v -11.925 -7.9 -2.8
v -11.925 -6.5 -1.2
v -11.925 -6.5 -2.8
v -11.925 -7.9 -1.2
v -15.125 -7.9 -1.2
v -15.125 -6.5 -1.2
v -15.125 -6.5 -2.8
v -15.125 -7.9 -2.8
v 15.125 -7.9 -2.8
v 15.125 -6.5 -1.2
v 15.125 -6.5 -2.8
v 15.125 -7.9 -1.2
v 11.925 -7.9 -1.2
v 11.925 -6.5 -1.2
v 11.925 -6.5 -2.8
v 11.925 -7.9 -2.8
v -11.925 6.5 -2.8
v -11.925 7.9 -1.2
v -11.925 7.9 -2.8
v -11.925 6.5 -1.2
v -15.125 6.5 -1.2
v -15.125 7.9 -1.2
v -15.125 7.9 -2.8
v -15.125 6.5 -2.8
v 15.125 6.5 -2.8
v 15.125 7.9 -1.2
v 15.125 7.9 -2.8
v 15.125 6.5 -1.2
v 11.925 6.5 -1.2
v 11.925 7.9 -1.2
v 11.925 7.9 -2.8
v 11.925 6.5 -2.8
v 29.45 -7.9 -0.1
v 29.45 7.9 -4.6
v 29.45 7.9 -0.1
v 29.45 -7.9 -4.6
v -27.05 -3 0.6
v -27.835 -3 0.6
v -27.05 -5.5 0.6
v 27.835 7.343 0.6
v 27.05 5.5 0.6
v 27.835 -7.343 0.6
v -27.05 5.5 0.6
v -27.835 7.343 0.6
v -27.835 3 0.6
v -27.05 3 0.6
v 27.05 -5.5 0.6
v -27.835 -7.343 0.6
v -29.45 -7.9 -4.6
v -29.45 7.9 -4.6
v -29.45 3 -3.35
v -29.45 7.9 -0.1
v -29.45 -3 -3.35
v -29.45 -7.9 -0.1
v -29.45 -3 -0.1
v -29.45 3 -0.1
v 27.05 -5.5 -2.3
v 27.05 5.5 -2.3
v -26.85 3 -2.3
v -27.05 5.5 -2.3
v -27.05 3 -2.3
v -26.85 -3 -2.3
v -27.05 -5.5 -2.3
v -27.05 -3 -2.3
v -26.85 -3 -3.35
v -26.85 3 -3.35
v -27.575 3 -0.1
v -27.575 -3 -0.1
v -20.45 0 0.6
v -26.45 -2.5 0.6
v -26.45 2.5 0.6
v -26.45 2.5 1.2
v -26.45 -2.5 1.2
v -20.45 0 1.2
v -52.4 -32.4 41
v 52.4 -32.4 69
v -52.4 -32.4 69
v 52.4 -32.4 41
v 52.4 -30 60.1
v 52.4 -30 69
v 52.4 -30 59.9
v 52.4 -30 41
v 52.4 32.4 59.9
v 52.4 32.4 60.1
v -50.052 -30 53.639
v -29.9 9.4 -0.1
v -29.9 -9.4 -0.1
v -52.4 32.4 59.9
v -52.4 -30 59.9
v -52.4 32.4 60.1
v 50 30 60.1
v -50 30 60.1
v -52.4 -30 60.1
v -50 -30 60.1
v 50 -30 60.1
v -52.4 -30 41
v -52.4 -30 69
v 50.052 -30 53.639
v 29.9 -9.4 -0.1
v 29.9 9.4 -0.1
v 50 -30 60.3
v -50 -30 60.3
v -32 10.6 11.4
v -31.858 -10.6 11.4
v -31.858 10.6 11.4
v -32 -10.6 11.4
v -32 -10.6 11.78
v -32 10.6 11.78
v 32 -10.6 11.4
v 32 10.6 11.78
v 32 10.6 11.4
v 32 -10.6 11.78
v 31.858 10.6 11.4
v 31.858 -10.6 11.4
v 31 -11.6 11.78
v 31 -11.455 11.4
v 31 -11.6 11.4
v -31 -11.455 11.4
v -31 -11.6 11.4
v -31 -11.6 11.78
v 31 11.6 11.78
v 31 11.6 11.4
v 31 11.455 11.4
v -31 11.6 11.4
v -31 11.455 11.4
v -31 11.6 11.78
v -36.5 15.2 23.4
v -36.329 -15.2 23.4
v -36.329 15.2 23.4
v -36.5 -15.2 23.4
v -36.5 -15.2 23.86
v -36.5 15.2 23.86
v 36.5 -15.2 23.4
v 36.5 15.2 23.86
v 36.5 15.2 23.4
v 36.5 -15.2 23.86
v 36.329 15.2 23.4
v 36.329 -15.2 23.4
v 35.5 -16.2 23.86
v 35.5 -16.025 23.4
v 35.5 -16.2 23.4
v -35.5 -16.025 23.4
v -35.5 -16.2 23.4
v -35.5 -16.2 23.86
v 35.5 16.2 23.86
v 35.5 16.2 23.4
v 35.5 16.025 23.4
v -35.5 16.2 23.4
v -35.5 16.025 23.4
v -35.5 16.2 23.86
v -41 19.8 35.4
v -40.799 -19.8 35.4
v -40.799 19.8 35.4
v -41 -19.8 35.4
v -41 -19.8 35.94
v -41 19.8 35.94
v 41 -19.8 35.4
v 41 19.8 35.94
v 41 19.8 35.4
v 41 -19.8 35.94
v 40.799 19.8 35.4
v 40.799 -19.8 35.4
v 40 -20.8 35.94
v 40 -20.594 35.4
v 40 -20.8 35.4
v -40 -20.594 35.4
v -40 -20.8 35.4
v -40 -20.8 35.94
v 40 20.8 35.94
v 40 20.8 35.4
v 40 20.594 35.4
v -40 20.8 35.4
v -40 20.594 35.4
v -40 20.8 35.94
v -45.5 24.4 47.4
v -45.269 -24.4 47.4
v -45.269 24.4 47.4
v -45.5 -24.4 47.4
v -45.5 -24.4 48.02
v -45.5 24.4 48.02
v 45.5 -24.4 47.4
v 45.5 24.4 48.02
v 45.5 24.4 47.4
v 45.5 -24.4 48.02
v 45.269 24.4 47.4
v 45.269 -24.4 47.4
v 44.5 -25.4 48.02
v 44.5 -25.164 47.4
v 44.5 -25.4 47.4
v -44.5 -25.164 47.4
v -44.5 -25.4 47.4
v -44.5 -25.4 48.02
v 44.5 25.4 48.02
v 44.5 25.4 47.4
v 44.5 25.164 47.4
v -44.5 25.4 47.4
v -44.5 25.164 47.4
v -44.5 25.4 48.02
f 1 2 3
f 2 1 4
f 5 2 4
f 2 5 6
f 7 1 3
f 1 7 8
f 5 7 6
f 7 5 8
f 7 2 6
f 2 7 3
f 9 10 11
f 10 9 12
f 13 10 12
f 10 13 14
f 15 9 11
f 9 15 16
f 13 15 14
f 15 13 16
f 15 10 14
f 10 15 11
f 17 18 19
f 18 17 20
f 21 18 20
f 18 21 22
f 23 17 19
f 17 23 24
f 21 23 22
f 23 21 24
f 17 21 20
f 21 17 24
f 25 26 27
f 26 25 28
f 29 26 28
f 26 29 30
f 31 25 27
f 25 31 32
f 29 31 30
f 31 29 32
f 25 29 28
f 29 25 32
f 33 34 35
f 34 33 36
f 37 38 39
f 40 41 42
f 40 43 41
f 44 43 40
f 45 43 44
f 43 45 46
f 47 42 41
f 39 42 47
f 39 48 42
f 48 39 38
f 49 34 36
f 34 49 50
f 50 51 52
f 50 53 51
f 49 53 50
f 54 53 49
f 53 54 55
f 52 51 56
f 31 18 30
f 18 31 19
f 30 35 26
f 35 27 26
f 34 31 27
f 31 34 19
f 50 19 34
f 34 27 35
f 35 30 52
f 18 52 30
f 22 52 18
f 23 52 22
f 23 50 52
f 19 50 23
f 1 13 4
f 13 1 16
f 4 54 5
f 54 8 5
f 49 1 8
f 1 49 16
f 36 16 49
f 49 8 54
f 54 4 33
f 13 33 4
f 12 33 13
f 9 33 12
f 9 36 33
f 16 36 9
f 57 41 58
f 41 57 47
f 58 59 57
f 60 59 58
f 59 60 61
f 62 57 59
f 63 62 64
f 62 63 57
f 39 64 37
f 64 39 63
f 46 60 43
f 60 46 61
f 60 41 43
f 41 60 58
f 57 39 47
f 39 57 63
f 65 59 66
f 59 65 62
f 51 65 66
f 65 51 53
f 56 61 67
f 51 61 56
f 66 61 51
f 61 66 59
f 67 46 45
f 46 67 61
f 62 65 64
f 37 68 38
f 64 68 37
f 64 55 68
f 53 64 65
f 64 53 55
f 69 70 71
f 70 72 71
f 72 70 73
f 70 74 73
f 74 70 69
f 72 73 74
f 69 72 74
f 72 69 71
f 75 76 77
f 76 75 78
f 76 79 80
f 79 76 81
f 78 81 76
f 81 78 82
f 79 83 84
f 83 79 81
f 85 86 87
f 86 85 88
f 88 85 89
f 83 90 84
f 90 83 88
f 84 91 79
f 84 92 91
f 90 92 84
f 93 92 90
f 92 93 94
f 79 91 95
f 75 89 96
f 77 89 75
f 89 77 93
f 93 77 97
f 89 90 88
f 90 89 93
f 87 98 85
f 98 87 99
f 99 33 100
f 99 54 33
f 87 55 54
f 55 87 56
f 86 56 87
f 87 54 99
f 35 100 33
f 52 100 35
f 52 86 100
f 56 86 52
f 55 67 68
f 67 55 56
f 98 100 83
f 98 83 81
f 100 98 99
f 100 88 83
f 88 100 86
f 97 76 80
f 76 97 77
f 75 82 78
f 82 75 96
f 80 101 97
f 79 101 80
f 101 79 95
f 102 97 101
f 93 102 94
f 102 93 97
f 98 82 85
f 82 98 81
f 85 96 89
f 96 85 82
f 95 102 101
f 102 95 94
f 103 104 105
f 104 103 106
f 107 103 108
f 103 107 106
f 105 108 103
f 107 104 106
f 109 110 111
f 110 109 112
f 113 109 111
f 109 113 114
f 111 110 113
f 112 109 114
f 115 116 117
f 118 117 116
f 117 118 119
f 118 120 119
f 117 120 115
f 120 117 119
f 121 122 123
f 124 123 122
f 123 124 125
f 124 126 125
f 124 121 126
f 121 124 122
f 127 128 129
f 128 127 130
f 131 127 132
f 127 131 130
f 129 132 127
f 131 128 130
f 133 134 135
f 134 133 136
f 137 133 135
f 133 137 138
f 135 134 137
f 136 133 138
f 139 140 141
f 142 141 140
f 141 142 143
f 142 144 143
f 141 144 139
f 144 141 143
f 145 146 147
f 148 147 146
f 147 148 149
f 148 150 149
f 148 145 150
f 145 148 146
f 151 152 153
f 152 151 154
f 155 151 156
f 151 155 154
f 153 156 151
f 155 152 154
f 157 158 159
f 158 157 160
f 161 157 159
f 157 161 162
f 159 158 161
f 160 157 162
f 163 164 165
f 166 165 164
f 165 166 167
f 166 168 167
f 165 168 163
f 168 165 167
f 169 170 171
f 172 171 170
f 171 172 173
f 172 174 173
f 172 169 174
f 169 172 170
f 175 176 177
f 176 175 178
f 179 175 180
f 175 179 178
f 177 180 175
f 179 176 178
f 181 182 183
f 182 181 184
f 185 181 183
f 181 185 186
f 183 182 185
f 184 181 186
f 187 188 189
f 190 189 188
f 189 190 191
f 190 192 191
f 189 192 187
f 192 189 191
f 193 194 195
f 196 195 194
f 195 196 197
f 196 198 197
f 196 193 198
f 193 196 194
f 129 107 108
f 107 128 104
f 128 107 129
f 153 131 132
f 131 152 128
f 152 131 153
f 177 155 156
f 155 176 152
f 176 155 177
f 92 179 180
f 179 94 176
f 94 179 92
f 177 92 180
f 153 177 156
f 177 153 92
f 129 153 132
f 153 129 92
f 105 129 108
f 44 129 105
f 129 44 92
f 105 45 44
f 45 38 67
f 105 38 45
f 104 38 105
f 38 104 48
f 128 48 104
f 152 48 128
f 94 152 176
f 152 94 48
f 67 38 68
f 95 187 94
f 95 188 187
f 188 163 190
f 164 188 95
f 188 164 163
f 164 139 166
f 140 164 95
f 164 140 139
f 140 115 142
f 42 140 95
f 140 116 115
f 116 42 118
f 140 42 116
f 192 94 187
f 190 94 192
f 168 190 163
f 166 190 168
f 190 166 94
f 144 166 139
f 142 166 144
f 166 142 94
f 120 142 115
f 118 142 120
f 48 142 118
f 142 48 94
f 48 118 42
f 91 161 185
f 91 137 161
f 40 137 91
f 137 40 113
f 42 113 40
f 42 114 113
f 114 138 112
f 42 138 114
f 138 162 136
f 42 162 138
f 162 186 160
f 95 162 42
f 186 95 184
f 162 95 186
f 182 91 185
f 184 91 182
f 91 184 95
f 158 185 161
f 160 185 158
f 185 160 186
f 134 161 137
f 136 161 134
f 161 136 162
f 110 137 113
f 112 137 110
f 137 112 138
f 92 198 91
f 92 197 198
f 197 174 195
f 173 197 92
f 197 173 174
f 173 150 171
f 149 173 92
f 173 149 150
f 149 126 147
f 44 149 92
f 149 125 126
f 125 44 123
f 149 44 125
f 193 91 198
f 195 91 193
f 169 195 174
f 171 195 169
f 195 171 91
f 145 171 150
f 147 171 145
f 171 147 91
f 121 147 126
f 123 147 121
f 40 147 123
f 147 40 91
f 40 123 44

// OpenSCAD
// LED hood + rail for one trifold position (3 WS2812E LEDs).
// Starting sizes — measure your strip and retune before printing a full set.
// See README heading "Prints".
// Print mouth-down for clean walls.

$fn = 48;

// --- Strip (measure yours; 5 V 60/m is often 10 mm wide, ~16.7 mm pitch) ---
led_pitch = 16.7;
leds_per_group = 3;
strip_width = 10;
strip_thickness = 2.2;
rail_channel_extra = 1;     // channel ~1 mm wider than the strip
rail_channel_depth = 2;
rail_wall = 2.4;
rail_lip = 0.8;             // holds the strip without relying on adhesive
zip_slot_w = 3.2;
zip_slot_h = 1.6;

// --- Hood (rectangular snoot) ---
led_opening_w = 55;         // inner opening at the LED end
led_opening_h = 14;
mouth_w = 100;              // flare at the mouth (guide: 90–110)
mouth_h = 60;               // flare at the mouth (guide: 50–70)
hood_depth = 60;            // guide: 50–70
wall = 2.4;
visor_length = 18;          // student-side brim so LEDs stay out of view
visor_drop = 10;
trap_count = 4;             // shallow light-trap grooves on inner walls
trap_depth = 0.6;
trap_width = 1.2;

// --- Wire exit and data-arrow mark ---
wire_slot_w = 6;
wire_slot_h = 4;
arrow_mark = true;

module rail() {
    inner_w = leds_per_group * led_pitch + 4;
    inner_d = strip_width + rail_channel_extra;
    outer_w = inner_w + 2 * rail_wall;
    outer_d = inner_d + 2 * rail_wall;
    outer_h = rail_channel_depth + rail_wall + rail_lip;

    difference() {
        cube([outer_w, outer_d, outer_h], center = true);

        // Strip channel, open at the top except for side lips
        translate([0, 0, rail_wall / 2])
            cube([inner_w, inner_d, rail_channel_depth + rail_lip + 0.2], center = true);

        // Lip gap so the strip seats, then lips keep it from lifting
        translate([0, 0, outer_h / 2 - rail_lip / 2 + 0.05])
            cube([inner_w - 4, inner_d - 2 * rail_lip, rail_lip + 0.2], center = true);

        // Wire exit at the DIN end (negative X)
        translate([-outer_w / 2 + rail_wall / 2, 0, rail_wall / 2 - strip_thickness / 4])
            cube([rail_wall + 0.4, wire_slot_w, wire_slot_h], center = true);

        // Zip-tie slots along both long walls
        for (s = [-1, 1])
            for (x = [-inner_w / 4, inner_w / 4])
                translate([x, s * (outer_d / 2 - 0.4), 0])
                    cube([zip_slot_w, 2, zip_slot_h], center = true);
    }

    if (arrow_mark) {
        // Raised arrow on the DIN end: data flows +X (away from DIN)
        translate([-outer_w / 2 + 6, 0, outer_h / 2])
            linear_extrude(0.6)
                polygon([[-3, -2.5], [3, 0], [-3, 2.5]]);
    }
}

module hood_outer() {
    hull() {
        translate([0, 0, 0])
            cube([led_opening_w + 2 * wall, led_opening_h + 2 * wall, 0.2], center = true);
        translate([0, 0, hood_depth])
            cube([mouth_w + 2 * wall, mouth_h + 2 * wall, 0.2], center = true);
    }
}

module hood_inner() {
    hull() {
        translate([0, 0, -0.2])
            cube([led_opening_w, led_opening_h, 0.2], center = true);
        translate([0, 0, hood_depth + 0.2])
            cube([mouth_w, mouth_h, 0.2], center = true);
    }
}

module visor() {
    // Extra wall on the student side of the mouth (negative Y)
    translate([0, -(mouth_h / 2 + wall / 2), hood_depth - visor_drop / 2])
        cube([mouth_w + 2 * wall, wall, visor_length + visor_drop], center = true);
}

module light_traps() {
    for (i = [1 : trap_count]) {
        z = i * hood_depth / (trap_count + 1);
        t = z / hood_depth;
        w = led_opening_w + t * (mouth_w - led_opening_w);
        h = led_opening_h + t * (mouth_h - led_opening_h);
        translate([0, 0, z]) {
            // Grooves on the four inner walls
            for (sx = [-1, 1])
                translate([sx * (w / 2 - trap_depth / 2), 0, 0])
                    cube([trap_depth, h - 2, trap_width], center = true);
            for (sy = [-1, 1])
                translate([0, sy * (h / 2 - trap_depth / 2), 0])
                    cube([w - 2, trap_depth, trap_width], center = true);
        }
    }
}

module hood() {
    difference() {
        union() {
            hood_outer();
            visor();
        }
        hood_inner();
        light_traps();
        // Opening into the rail at the LED end
        translate([0, 0, -0.5])
            cube([led_opening_w - 2, led_opening_h - 2, 4], center = true);
    }
}

module assembly() {
    // Overlap the rail into the hood so they fuse into one printable body.
    rail_h = rail_channel_depth + rail_wall + rail_lip;
    translate([0, 0, -rail_h / 2 + 0.6])
        rail();
    hood();
}

assembly();
